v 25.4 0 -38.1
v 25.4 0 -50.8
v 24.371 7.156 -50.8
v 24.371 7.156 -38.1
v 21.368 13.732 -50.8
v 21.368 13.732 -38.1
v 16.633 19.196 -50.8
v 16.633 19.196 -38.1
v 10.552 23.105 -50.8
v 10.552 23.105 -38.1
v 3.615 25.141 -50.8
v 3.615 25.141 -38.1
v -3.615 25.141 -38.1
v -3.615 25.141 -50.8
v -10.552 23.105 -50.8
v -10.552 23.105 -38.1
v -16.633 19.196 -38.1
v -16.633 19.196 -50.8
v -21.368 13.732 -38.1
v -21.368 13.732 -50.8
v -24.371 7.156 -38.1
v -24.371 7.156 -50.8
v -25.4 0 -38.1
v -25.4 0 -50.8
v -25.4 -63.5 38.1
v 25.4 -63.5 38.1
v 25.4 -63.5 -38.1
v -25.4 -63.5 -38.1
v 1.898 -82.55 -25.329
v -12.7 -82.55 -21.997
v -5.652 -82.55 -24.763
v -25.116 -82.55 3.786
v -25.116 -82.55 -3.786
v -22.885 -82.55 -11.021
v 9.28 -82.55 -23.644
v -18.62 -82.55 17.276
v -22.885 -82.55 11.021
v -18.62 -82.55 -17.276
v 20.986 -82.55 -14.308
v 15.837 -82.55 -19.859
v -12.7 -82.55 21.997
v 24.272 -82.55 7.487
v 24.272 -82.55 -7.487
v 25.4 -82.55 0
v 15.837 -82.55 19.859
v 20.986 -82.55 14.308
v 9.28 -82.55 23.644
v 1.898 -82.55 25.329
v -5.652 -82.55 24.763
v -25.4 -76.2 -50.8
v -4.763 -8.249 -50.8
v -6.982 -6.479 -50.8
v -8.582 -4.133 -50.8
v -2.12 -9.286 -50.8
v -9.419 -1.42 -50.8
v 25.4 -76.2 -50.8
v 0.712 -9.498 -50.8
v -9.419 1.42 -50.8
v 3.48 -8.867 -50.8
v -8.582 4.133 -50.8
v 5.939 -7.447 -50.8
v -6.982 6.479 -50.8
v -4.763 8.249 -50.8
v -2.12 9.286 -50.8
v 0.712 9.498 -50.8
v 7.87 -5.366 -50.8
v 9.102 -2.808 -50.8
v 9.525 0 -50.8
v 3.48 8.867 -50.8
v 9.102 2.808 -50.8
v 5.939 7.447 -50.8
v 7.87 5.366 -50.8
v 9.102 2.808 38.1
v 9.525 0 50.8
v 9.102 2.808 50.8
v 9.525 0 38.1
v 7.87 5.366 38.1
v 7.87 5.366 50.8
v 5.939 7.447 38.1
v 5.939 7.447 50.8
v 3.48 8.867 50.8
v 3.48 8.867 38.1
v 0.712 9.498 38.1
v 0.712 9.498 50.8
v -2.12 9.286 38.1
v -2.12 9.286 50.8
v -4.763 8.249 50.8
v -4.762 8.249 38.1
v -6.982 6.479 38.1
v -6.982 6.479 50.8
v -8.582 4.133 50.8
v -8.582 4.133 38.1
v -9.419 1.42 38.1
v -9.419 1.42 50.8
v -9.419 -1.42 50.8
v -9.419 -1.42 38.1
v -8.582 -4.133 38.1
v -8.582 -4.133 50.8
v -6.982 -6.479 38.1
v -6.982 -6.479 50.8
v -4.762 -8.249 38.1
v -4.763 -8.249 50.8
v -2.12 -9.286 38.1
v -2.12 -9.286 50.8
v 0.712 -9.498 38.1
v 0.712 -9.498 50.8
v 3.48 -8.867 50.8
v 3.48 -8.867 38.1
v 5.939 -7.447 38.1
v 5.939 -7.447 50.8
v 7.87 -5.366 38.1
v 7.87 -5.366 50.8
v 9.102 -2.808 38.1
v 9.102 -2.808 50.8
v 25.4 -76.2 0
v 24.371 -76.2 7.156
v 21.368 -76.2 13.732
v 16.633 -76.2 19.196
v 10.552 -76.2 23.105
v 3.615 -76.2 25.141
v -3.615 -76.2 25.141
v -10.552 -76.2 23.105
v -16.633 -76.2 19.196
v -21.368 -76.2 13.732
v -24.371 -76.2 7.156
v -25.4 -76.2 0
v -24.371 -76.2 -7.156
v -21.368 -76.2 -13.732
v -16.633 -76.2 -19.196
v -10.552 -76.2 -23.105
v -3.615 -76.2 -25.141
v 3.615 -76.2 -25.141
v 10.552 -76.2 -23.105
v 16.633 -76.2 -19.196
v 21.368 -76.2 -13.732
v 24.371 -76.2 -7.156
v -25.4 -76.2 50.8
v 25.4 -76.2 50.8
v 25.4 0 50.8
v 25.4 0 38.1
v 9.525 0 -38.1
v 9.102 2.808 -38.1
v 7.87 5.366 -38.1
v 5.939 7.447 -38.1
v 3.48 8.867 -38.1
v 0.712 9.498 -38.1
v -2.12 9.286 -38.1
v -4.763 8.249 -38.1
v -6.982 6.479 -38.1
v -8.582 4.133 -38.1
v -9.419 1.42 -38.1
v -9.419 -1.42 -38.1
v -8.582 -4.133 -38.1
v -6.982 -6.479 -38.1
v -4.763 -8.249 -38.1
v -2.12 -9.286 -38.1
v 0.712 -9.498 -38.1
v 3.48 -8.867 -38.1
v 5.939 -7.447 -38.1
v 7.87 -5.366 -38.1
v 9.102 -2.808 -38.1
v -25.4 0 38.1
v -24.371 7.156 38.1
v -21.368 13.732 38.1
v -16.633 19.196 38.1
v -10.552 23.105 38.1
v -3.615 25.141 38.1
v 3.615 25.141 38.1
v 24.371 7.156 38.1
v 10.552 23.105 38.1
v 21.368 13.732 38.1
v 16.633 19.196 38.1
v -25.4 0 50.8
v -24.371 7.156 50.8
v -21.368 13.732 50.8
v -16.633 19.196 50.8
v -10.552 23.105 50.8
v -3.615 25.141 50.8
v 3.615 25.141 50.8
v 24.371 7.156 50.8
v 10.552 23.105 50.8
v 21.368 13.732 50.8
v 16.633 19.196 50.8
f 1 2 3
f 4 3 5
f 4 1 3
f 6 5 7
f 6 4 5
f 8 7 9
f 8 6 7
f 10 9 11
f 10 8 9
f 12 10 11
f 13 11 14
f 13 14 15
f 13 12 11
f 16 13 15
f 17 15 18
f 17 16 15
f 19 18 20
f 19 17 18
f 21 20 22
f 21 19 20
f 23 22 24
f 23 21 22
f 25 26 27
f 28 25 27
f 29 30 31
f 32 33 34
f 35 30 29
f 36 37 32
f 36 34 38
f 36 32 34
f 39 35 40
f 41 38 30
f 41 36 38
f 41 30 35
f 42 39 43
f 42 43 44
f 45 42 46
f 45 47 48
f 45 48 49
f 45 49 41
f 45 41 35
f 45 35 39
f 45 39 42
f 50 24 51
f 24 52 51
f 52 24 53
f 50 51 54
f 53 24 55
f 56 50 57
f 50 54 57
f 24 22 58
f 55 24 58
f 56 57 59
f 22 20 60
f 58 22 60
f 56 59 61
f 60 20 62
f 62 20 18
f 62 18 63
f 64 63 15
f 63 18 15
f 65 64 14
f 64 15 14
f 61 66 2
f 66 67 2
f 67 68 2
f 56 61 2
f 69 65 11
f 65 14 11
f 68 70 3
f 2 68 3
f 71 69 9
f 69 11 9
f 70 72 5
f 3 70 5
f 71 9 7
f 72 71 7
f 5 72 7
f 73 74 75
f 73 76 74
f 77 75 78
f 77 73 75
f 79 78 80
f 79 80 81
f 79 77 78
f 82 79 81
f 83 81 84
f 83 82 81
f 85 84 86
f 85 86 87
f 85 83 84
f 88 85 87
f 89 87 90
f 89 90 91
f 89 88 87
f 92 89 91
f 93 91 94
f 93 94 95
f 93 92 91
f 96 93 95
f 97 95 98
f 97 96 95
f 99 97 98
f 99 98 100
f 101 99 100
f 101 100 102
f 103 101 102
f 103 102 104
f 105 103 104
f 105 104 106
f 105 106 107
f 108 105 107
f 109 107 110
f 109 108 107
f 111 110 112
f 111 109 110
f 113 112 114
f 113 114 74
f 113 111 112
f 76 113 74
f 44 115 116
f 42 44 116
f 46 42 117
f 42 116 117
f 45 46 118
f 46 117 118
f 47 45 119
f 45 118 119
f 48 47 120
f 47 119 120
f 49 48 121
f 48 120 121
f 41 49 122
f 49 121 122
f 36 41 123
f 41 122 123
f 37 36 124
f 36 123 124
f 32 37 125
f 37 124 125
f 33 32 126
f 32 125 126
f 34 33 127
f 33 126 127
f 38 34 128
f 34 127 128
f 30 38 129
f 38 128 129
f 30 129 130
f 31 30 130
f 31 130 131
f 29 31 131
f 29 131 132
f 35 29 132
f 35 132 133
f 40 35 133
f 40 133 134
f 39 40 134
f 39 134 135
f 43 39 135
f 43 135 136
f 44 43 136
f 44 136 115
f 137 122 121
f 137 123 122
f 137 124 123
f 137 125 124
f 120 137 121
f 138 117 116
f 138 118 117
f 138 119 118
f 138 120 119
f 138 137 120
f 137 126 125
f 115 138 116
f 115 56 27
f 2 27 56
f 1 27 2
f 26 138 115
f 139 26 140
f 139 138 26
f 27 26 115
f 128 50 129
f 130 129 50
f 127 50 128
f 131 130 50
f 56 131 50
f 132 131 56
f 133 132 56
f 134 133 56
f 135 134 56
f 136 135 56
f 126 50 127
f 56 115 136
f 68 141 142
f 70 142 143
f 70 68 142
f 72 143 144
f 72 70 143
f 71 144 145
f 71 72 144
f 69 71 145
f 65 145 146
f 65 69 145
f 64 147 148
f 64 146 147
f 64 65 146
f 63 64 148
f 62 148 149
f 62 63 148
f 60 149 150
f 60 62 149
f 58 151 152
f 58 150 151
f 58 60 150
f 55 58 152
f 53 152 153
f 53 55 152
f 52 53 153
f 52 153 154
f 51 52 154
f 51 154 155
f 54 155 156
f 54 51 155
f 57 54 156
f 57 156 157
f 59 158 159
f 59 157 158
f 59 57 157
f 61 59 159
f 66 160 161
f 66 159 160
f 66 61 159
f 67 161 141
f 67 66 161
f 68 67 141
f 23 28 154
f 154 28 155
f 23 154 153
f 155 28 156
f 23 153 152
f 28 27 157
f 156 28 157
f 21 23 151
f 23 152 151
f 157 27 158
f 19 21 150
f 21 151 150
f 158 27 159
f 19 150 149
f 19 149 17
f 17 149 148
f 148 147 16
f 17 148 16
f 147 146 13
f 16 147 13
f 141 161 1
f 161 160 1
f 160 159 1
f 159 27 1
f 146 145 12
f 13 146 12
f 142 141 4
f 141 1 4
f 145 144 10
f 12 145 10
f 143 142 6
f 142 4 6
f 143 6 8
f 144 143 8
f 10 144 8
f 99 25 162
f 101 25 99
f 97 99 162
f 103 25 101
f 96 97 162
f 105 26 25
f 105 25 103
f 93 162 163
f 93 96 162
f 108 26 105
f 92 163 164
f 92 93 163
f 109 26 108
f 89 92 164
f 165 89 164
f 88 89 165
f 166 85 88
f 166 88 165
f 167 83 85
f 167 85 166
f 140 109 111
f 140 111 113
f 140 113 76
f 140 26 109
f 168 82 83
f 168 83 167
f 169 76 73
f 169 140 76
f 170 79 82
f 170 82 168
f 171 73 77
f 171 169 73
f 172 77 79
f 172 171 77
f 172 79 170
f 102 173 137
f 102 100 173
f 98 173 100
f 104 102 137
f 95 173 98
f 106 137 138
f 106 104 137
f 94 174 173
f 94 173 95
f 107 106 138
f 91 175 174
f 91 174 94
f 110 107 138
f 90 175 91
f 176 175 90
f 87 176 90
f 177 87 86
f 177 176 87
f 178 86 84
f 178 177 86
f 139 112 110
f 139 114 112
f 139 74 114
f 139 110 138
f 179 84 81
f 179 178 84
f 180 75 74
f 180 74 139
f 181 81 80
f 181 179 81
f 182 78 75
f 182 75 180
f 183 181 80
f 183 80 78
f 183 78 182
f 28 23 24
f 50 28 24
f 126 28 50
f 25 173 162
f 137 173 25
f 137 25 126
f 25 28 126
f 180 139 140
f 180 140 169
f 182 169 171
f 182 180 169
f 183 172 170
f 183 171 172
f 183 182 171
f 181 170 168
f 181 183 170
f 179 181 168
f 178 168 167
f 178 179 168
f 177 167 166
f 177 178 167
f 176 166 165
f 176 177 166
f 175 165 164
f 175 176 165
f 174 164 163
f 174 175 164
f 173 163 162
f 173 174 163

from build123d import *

# Parameters (mm, degrees)
SKETCH1_R               = 9.525
BOSS_EXTRUDE1_DEPTH     = 50.8
SKETCH2_W               = 76.2
SKETCH2_H               = 88.9
CUT_EXTRUDE1_DEPTH      = 26.4
CUT_EXTRUDE1_DEPTH_BACK = 26.4
SKETCH3_R               = 25.4
BOSS_EXTRUDE2_DEPTH     = 6.35


with BuildPart() as part:
    # Sketch1 → Boss-Extrude1 (new body, symmetric)
    with BuildSketch(Plane.XY):
        with BuildLine():
            Line((-25.4, 0), (-25.4, -76.2))
            Line((-25.4, -76.2), (25.4, -76.2))
            Line((25.4, -76.2), (25.4, 0))
            ThreePointArc((25.4, 0), (0, 25.4), (-25.4, 0))
        make_face()
        Circle(SKETCH1_R, mode=Mode.SUBTRACT)
    extrude(amount=BOSS_EXTRUDE1_DEPTH, both=True)

    # Sketch2 → Cut-Extrude1 (cut, two sides)
    with BuildSketch(Plane(origin=(0, 0, 0), x_dir=(0, 0, -1), z_dir=(1, 0, 0))) as cut_extrude1_sk:
        with Locations((0, -19.05)):
            Rectangle(SKETCH2_W, SKETCH2_H)
    extrude(amount=CUT_EXTRUDE1_DEPTH, mode=Mode.SUBTRACT)
    extrude(cut_extrude1_sk.sketch, amount=-CUT_EXTRUDE1_DEPTH_BACK, mode=Mode.SUBTRACT)

    # Sketch3 → Boss-Extrude2 (add)
    with BuildSketch(Plane.XZ.offset(76.2)):
        Circle(SKETCH3_R)
    extrude(amount=BOSS_EXTRUDE2_DEPTH)


solid = part.part
